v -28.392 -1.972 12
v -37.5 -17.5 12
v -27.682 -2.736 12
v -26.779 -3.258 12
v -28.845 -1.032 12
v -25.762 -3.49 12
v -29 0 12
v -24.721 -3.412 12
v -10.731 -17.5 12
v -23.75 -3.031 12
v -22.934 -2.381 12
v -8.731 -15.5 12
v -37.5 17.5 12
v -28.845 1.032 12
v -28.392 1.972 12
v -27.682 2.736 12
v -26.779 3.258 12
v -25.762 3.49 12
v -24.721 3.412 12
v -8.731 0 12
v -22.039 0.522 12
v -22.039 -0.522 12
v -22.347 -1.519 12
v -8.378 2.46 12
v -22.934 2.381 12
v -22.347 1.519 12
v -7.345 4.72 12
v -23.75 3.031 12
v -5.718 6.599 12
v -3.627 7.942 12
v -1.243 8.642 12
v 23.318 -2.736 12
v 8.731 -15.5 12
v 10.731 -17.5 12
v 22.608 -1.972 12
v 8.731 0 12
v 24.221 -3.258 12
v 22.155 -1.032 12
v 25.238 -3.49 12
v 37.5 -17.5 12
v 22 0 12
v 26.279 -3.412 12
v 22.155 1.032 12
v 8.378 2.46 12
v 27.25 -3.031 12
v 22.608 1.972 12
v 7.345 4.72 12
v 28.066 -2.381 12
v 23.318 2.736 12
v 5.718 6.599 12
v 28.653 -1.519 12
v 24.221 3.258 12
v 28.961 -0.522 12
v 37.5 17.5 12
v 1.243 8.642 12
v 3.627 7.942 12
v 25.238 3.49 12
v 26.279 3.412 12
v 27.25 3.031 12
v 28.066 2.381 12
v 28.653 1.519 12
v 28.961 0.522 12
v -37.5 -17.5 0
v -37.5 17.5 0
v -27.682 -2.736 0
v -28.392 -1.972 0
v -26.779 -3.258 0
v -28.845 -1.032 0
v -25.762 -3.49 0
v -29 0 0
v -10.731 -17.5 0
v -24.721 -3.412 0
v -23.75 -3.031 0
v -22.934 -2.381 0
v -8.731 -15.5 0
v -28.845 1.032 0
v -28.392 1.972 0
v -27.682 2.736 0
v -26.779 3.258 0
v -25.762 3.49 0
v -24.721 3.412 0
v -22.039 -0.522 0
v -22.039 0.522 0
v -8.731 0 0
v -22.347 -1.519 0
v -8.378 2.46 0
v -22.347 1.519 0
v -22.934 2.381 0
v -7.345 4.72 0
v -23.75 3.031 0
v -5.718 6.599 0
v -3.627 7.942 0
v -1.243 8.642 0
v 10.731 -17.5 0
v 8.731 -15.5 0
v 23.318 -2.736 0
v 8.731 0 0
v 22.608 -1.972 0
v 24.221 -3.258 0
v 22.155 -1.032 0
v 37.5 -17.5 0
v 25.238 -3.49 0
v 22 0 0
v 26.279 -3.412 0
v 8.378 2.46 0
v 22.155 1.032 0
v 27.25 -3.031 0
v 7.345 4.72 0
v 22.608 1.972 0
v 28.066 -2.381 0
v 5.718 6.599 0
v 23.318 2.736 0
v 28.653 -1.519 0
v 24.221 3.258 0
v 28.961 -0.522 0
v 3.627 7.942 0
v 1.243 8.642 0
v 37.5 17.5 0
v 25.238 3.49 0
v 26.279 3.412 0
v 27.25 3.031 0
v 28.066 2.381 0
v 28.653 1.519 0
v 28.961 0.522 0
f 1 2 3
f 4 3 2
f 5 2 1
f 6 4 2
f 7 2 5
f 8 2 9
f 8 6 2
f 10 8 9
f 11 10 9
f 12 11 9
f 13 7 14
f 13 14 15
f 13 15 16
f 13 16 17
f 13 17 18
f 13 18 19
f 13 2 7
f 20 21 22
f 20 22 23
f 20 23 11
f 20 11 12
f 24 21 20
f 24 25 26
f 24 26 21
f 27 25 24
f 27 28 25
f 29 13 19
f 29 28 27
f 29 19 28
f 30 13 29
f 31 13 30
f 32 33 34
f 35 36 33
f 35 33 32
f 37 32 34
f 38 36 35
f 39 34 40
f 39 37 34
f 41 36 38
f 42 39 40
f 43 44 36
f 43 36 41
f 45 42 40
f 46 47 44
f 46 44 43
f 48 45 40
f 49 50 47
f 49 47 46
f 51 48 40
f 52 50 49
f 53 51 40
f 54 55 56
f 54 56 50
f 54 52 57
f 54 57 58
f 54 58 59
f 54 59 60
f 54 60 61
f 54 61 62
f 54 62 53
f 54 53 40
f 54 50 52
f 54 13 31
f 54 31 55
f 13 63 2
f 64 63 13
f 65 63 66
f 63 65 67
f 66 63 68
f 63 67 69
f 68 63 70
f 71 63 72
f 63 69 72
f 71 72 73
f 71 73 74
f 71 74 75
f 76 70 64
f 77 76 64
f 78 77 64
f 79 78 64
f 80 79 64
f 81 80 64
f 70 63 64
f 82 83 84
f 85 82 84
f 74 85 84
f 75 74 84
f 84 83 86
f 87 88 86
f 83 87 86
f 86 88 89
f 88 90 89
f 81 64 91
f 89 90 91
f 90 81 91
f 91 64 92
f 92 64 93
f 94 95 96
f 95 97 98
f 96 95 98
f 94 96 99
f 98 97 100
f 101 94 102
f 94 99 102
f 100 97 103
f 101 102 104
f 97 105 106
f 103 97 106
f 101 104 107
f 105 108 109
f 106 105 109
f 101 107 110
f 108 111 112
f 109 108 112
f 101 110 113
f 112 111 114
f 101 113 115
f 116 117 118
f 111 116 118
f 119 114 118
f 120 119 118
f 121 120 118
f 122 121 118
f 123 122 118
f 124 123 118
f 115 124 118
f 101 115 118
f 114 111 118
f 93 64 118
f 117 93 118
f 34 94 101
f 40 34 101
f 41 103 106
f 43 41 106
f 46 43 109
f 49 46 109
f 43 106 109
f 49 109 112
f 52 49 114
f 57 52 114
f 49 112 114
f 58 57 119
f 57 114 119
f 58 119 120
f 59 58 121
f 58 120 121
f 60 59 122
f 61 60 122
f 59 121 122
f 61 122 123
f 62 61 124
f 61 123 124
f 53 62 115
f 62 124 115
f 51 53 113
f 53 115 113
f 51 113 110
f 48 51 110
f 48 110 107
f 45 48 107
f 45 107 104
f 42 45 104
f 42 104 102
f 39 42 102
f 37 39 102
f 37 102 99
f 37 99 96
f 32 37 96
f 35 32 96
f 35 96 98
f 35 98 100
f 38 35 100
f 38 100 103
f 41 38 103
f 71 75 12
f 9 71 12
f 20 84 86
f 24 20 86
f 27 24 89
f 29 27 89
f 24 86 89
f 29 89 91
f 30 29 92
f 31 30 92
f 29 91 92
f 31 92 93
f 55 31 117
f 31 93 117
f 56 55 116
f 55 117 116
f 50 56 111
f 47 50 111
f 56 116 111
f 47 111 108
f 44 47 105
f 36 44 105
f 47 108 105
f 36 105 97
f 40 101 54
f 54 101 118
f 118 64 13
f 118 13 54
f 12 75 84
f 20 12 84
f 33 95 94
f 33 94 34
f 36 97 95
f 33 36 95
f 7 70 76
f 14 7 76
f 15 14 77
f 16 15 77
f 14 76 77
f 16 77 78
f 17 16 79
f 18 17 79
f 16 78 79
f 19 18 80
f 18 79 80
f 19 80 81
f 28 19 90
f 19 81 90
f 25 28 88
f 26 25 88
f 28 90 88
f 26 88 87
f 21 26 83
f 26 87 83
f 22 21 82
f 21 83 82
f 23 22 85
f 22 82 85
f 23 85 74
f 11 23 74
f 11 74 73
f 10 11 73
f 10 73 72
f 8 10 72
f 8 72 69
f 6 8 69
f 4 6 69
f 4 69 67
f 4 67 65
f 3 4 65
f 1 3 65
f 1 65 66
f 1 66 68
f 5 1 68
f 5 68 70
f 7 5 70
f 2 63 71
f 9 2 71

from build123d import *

# Parameters (mm, degrees)
SKETCH1_W             = 75
SKETCH1_H             = 35
BOSS_EXTRUDE1_DEPTH   = 12
CUT_EXTRUDE1_REACH    = 45.087
M8X1_0_TAPPED_HOLE1_D = 7
CHAMFER1_SIZE         = 2


with BuildPart() as part:
    # Sketch1 → Boss-Extrude1 (new body)
    with BuildSketch(Plane.XY):
        Rectangle(SKETCH1_W, SKETCH1_H)
    extrude(amount=BOSS_EXTRUDE1_DEPTH)

    # Sketch2 → Cut-Extrude1 (cut, up to next)
    with BuildSketch(Plane(origin=(0, 0, 0), x_dir=(-1, 0, 0), z_dir=(0, 0, -1)), mode=Mode.PRIVATE) as cut_extrude1_sk1:
        with BuildLine():
            Line((-8.73125, 0), (-8.73125, -17.5))
            Line((-8.73125, -17.5), (8.73125, -17.5))
            Line((8.73125, -17.5), (8.73125, 0))
            ThreePointArc((8.73125, 0), (0, 8.73125), (-8.73125, 0))
        make_face()
    cut_extrude1_tool1 = extrude(cut_extrude1_sk1.sketch, amount=-CUT_EXTRUDE1_REACH, mode=Mode.PRIVATE) & part.part
    add(cut_extrude1_tool1.solids().sort_by_distance((0, -5.243288, 0))[0], mode=Mode.SUBTRACT)

    # M8x1.0 Tapped Hole1 (through all)
    with Locations(Plane.XY.offset(12)):
        with Locations((-25.5, 0), (25.5, 0)):
            Hole(M8X1_0_TAPPED_HOLE1_D / 2)

    # Chamfer1
    chamfer1_edges = [part.edges().sort_by_distance(p)[0] for p in [
        (-8.73125, -17.5, 6),
        (8.73125, -17.5, 6),
    ]]
    chamfer(chamfer1_edges, length=CHAMFER1_SIZE)


solid = part.part
